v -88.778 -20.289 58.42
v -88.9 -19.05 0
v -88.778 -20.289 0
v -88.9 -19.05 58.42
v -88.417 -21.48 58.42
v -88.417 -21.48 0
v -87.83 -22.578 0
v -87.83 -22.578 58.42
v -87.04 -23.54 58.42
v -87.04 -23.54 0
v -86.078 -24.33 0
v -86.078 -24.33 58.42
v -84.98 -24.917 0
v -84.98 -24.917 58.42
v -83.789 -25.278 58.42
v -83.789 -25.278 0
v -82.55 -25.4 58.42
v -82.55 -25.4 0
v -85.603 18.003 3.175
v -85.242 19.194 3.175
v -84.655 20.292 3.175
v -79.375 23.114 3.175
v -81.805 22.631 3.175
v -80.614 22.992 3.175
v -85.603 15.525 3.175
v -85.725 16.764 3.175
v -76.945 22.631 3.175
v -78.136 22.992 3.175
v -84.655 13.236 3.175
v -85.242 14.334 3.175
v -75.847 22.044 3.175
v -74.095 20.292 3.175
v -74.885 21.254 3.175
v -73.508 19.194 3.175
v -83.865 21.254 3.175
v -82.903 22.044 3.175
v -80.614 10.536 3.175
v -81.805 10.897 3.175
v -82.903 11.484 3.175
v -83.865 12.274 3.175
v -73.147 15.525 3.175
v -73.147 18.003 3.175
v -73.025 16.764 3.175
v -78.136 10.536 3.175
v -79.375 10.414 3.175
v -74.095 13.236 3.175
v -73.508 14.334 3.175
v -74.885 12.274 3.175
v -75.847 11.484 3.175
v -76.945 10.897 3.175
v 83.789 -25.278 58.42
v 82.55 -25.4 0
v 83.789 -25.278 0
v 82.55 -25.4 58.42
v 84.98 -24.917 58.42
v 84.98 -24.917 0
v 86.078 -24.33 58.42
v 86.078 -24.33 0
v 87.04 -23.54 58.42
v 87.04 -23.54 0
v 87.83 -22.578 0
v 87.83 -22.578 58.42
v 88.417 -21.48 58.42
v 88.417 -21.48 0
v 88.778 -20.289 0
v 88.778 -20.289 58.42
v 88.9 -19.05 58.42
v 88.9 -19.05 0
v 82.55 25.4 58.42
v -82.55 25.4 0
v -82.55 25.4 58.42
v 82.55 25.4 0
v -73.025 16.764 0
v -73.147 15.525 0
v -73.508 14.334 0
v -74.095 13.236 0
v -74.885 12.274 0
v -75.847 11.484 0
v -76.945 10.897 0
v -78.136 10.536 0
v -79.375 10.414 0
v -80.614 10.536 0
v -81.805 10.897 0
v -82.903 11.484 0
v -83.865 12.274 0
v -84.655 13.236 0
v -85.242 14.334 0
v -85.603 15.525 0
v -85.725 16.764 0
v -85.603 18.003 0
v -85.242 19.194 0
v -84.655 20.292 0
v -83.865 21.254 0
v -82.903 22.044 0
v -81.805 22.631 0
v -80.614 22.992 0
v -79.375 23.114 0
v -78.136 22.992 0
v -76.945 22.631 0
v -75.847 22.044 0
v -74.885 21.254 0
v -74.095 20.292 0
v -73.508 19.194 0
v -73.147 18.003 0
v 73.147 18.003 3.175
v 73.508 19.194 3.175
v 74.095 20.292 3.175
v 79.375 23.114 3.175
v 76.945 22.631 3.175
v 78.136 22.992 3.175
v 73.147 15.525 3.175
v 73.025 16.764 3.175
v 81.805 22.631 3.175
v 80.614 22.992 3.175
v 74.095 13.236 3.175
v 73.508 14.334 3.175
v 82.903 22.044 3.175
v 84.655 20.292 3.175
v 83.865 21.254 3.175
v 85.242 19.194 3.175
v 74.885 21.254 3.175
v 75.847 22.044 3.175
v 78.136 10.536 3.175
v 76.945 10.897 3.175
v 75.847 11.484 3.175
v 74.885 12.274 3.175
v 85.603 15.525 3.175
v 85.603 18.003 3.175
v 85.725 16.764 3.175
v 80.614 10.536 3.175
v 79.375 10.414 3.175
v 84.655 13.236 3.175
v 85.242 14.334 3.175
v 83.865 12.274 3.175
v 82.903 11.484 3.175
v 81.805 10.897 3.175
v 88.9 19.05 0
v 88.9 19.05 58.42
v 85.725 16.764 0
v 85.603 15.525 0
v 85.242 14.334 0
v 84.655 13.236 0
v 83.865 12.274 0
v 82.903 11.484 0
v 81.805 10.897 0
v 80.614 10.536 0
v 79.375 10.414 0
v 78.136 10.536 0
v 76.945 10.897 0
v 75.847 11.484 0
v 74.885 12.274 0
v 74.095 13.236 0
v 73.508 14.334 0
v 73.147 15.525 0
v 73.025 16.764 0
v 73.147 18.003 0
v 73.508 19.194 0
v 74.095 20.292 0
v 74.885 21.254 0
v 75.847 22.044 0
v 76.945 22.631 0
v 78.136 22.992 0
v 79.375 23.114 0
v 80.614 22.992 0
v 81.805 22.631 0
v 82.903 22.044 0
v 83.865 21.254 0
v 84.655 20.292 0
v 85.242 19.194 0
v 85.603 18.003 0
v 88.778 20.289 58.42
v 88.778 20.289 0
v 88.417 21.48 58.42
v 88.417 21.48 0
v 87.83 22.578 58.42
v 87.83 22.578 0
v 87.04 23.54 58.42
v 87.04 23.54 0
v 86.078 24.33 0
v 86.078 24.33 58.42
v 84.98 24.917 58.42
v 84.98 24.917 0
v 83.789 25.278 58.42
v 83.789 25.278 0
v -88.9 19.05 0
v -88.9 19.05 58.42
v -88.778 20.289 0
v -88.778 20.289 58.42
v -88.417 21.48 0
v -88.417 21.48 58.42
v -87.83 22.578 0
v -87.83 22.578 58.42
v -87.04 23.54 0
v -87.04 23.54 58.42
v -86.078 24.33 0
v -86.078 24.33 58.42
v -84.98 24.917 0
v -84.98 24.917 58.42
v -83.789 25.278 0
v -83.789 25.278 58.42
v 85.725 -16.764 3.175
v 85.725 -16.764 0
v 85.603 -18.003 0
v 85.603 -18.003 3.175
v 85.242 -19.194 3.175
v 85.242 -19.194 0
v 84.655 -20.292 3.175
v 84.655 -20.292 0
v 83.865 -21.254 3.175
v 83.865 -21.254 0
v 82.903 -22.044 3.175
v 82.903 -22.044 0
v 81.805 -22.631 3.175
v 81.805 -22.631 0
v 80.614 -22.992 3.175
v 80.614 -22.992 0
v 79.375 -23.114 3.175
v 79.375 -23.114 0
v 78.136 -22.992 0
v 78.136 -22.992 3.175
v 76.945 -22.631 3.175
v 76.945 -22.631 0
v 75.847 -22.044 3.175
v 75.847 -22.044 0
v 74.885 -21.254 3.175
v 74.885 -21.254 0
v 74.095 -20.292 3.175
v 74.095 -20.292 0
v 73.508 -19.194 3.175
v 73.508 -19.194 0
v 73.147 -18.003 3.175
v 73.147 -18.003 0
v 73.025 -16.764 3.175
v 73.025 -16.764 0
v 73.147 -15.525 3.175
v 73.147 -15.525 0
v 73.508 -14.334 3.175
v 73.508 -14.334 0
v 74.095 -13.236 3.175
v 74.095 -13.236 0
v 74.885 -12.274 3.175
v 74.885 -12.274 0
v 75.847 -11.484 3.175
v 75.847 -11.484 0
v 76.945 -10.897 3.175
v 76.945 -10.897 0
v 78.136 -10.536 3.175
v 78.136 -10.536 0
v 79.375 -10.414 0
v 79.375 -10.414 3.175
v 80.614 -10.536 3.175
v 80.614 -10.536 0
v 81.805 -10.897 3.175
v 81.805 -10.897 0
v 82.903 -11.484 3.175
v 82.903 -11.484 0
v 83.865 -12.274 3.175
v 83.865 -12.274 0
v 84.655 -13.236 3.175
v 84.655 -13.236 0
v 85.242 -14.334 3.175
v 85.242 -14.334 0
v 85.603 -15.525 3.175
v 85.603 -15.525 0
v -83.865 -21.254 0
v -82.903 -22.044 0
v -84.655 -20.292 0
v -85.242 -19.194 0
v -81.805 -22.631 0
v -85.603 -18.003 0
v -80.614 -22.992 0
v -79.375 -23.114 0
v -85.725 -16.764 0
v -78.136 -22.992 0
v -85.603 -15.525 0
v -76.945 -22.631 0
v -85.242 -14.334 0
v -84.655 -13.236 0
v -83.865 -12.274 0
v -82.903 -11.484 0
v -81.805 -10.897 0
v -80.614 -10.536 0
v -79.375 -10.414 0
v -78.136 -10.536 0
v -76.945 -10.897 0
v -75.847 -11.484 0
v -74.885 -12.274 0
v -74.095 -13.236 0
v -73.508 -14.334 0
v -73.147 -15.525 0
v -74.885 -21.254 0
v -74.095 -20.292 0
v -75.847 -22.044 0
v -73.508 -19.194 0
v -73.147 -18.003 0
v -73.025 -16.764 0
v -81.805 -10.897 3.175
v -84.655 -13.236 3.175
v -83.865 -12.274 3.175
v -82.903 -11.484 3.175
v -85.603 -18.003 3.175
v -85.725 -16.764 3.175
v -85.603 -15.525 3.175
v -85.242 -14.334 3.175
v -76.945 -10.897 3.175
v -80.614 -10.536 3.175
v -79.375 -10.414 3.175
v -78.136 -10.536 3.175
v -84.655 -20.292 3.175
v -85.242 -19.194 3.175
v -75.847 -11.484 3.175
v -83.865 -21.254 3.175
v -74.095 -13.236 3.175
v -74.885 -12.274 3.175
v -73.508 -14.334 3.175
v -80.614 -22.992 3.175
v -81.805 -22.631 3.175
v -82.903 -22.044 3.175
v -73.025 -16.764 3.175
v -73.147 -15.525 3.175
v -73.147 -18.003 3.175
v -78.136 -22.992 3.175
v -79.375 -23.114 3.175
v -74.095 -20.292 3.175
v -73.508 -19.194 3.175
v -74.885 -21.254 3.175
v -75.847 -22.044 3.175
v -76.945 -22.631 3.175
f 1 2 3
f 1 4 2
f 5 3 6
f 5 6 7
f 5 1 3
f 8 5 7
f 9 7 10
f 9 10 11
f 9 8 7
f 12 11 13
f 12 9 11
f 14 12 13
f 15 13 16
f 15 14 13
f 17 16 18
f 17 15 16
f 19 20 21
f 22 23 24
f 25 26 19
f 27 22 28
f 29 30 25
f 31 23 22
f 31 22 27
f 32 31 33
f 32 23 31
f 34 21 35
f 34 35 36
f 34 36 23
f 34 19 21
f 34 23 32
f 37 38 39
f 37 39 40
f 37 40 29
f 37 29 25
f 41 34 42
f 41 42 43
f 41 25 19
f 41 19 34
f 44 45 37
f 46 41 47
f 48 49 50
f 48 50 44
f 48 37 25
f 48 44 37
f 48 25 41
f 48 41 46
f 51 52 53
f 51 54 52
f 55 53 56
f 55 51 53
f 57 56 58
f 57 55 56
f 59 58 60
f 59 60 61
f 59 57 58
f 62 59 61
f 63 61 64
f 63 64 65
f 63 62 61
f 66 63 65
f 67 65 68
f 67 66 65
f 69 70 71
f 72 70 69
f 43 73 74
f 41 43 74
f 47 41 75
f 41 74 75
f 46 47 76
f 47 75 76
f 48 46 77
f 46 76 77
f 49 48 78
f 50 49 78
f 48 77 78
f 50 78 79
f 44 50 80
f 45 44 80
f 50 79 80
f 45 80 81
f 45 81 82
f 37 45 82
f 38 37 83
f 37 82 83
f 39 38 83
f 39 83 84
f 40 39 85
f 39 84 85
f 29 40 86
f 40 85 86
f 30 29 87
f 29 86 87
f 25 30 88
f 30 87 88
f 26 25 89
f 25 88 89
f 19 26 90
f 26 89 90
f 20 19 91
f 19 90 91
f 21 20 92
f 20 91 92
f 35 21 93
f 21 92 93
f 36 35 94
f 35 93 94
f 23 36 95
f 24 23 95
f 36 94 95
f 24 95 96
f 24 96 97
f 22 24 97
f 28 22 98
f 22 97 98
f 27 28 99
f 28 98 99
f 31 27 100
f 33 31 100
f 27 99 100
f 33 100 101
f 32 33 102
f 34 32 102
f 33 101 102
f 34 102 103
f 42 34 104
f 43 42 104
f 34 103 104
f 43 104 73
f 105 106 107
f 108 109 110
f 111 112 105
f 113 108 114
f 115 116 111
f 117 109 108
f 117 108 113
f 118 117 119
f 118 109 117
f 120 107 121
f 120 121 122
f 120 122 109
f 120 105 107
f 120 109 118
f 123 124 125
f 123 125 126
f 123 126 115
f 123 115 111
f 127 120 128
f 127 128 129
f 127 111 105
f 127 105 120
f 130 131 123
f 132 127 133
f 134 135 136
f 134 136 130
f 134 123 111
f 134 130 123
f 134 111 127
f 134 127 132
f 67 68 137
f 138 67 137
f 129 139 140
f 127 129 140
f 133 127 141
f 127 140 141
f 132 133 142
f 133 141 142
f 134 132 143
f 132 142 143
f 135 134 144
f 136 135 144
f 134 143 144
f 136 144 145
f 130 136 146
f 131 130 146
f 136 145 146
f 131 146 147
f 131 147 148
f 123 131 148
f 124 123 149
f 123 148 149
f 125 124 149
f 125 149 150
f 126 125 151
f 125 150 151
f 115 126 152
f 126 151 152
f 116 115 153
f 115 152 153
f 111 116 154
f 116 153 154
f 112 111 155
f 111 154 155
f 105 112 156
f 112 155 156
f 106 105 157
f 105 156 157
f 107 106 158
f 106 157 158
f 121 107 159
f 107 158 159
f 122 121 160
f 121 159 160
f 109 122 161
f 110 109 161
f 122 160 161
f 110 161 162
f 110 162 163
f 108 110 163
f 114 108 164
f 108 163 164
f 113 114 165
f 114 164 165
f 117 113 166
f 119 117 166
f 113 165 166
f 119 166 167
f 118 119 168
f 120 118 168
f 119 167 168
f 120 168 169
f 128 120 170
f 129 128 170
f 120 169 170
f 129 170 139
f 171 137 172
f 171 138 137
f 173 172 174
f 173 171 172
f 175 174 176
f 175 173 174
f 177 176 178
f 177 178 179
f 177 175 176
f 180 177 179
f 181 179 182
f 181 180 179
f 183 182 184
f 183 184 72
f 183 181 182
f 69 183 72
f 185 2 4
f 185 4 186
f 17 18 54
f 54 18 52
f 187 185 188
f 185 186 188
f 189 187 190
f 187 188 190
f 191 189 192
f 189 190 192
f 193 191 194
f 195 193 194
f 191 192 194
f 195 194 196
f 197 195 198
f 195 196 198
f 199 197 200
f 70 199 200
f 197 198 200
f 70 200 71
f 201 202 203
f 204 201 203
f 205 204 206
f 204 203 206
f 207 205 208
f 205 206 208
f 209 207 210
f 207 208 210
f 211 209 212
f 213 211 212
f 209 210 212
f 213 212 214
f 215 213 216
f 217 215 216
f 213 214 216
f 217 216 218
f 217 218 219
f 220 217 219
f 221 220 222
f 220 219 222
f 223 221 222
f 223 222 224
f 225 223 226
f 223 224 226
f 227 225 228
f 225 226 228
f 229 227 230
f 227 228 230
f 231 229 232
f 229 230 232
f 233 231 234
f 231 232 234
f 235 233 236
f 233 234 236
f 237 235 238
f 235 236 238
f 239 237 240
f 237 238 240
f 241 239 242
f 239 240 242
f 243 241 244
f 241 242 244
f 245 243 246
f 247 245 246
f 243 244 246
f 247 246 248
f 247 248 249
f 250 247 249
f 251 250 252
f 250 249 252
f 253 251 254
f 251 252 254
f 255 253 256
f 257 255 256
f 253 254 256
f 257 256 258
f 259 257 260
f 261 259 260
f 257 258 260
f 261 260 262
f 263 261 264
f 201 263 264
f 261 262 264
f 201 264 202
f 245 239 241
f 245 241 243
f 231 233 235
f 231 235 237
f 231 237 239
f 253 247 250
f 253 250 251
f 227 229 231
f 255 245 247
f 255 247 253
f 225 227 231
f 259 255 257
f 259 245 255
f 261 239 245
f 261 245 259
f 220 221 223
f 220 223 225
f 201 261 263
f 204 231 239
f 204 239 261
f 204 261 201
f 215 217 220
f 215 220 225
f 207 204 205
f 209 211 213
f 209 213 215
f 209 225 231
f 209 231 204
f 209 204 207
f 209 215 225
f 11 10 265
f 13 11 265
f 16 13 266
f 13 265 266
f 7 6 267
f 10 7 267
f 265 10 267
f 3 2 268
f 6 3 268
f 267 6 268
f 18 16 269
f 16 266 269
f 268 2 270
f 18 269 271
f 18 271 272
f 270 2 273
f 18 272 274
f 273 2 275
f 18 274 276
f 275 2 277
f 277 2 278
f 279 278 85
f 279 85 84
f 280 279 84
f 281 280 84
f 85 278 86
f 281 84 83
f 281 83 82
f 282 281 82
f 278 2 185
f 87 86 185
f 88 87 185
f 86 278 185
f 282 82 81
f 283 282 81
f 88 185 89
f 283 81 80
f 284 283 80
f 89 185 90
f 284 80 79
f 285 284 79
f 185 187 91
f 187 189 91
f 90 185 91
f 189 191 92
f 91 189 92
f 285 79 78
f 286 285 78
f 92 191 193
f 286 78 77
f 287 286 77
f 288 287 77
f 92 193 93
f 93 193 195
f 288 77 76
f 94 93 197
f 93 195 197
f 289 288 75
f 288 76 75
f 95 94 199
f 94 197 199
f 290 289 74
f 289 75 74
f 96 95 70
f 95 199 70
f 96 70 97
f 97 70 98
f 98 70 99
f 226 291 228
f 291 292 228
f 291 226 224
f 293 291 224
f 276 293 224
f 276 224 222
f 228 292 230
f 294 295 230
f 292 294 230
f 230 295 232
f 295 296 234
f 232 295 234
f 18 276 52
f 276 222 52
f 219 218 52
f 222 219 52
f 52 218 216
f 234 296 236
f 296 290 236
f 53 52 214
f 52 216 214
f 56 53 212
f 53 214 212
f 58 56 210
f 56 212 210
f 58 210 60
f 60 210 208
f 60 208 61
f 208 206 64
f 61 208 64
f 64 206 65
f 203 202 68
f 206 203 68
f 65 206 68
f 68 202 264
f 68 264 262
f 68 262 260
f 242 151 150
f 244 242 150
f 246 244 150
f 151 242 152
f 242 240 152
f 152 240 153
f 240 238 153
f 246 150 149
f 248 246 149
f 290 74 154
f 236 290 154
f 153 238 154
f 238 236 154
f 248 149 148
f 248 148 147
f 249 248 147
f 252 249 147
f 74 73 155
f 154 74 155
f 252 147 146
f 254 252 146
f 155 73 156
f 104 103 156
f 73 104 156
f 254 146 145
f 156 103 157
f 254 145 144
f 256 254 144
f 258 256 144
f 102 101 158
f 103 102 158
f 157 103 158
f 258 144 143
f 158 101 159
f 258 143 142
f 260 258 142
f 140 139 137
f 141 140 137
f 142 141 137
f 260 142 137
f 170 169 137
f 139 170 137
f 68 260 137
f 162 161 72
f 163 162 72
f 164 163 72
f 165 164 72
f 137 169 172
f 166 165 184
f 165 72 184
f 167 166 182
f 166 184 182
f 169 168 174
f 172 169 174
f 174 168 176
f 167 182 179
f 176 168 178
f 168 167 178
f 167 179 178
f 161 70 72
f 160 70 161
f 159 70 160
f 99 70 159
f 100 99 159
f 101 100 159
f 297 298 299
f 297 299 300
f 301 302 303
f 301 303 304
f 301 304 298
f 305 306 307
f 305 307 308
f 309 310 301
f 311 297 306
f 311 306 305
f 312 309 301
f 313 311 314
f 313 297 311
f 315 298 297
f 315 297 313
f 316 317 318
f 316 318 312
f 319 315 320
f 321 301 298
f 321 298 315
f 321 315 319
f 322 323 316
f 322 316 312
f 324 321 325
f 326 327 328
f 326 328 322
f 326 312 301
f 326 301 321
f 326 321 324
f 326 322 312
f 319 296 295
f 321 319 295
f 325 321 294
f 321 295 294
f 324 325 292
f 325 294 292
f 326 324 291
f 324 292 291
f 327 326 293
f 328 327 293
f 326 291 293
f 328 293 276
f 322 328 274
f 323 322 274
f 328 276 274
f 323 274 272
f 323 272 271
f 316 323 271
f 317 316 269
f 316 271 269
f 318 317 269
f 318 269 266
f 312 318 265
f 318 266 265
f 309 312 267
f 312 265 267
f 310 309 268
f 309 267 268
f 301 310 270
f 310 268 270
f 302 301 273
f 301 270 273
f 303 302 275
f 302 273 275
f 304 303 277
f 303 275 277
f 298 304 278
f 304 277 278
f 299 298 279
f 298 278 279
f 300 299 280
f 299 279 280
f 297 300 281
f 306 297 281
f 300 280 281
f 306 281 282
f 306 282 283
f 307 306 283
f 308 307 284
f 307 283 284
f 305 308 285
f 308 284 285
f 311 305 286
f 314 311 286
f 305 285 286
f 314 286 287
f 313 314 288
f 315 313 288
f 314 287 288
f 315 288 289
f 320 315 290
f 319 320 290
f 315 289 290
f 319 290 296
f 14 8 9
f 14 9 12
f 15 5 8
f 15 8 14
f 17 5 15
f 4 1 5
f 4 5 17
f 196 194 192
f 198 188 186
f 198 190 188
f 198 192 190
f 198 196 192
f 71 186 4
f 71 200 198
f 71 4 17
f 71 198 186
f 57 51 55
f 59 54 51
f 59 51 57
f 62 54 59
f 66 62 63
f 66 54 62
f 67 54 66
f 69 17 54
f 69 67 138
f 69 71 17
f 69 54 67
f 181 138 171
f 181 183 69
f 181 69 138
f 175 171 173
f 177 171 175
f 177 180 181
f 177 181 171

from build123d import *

# Parameters (mm, degrees)
F0_W     = 177.8
F0_H     = 50.8
F1_DEPTH = 58.42
F2_R     = 6.35
F3_R     = 6.35
F4_DEPTH = 3.175


with BuildPart() as f1:
    # F0 (on Top) → F1 (new body)
    with BuildSketch(Plane.XY):
        Rectangle(F0_W, F0_H)
    extrude(amount=F1_DEPTH)

    # F2
    f2_edges = [f1.edges().sort_by_distance(p)[0] for p in [
        (-88.9, 25.4, 29.21),
        (88.9, 25.4, 29.21),
        (88.9, -25.4, 29.21),
        (-88.9, -25.4, 29.21),
    ]]
    fillet(f2_edges, radius=F2_R)

    # F3 (on face) → F4 (cut)
    with BuildSketch(Plane(origin=(0, 0, 0), x_dir=(1, 0, 0), z_dir=(0, 0, -1))):
        with Locations((79.375, 16.764)):
            Circle(F3_R)
        with Locations((79.375, -16.764)):
            Circle(F3_R)
        with Locations((-79.375, 16.764)):
            Circle(F3_R)
        with Locations((-79.375, -16.764)):
            Circle(F3_R)
    extrude(amount=-F4_DEPTH, mode=Mode.SUBTRACT)


solid = f1.part
